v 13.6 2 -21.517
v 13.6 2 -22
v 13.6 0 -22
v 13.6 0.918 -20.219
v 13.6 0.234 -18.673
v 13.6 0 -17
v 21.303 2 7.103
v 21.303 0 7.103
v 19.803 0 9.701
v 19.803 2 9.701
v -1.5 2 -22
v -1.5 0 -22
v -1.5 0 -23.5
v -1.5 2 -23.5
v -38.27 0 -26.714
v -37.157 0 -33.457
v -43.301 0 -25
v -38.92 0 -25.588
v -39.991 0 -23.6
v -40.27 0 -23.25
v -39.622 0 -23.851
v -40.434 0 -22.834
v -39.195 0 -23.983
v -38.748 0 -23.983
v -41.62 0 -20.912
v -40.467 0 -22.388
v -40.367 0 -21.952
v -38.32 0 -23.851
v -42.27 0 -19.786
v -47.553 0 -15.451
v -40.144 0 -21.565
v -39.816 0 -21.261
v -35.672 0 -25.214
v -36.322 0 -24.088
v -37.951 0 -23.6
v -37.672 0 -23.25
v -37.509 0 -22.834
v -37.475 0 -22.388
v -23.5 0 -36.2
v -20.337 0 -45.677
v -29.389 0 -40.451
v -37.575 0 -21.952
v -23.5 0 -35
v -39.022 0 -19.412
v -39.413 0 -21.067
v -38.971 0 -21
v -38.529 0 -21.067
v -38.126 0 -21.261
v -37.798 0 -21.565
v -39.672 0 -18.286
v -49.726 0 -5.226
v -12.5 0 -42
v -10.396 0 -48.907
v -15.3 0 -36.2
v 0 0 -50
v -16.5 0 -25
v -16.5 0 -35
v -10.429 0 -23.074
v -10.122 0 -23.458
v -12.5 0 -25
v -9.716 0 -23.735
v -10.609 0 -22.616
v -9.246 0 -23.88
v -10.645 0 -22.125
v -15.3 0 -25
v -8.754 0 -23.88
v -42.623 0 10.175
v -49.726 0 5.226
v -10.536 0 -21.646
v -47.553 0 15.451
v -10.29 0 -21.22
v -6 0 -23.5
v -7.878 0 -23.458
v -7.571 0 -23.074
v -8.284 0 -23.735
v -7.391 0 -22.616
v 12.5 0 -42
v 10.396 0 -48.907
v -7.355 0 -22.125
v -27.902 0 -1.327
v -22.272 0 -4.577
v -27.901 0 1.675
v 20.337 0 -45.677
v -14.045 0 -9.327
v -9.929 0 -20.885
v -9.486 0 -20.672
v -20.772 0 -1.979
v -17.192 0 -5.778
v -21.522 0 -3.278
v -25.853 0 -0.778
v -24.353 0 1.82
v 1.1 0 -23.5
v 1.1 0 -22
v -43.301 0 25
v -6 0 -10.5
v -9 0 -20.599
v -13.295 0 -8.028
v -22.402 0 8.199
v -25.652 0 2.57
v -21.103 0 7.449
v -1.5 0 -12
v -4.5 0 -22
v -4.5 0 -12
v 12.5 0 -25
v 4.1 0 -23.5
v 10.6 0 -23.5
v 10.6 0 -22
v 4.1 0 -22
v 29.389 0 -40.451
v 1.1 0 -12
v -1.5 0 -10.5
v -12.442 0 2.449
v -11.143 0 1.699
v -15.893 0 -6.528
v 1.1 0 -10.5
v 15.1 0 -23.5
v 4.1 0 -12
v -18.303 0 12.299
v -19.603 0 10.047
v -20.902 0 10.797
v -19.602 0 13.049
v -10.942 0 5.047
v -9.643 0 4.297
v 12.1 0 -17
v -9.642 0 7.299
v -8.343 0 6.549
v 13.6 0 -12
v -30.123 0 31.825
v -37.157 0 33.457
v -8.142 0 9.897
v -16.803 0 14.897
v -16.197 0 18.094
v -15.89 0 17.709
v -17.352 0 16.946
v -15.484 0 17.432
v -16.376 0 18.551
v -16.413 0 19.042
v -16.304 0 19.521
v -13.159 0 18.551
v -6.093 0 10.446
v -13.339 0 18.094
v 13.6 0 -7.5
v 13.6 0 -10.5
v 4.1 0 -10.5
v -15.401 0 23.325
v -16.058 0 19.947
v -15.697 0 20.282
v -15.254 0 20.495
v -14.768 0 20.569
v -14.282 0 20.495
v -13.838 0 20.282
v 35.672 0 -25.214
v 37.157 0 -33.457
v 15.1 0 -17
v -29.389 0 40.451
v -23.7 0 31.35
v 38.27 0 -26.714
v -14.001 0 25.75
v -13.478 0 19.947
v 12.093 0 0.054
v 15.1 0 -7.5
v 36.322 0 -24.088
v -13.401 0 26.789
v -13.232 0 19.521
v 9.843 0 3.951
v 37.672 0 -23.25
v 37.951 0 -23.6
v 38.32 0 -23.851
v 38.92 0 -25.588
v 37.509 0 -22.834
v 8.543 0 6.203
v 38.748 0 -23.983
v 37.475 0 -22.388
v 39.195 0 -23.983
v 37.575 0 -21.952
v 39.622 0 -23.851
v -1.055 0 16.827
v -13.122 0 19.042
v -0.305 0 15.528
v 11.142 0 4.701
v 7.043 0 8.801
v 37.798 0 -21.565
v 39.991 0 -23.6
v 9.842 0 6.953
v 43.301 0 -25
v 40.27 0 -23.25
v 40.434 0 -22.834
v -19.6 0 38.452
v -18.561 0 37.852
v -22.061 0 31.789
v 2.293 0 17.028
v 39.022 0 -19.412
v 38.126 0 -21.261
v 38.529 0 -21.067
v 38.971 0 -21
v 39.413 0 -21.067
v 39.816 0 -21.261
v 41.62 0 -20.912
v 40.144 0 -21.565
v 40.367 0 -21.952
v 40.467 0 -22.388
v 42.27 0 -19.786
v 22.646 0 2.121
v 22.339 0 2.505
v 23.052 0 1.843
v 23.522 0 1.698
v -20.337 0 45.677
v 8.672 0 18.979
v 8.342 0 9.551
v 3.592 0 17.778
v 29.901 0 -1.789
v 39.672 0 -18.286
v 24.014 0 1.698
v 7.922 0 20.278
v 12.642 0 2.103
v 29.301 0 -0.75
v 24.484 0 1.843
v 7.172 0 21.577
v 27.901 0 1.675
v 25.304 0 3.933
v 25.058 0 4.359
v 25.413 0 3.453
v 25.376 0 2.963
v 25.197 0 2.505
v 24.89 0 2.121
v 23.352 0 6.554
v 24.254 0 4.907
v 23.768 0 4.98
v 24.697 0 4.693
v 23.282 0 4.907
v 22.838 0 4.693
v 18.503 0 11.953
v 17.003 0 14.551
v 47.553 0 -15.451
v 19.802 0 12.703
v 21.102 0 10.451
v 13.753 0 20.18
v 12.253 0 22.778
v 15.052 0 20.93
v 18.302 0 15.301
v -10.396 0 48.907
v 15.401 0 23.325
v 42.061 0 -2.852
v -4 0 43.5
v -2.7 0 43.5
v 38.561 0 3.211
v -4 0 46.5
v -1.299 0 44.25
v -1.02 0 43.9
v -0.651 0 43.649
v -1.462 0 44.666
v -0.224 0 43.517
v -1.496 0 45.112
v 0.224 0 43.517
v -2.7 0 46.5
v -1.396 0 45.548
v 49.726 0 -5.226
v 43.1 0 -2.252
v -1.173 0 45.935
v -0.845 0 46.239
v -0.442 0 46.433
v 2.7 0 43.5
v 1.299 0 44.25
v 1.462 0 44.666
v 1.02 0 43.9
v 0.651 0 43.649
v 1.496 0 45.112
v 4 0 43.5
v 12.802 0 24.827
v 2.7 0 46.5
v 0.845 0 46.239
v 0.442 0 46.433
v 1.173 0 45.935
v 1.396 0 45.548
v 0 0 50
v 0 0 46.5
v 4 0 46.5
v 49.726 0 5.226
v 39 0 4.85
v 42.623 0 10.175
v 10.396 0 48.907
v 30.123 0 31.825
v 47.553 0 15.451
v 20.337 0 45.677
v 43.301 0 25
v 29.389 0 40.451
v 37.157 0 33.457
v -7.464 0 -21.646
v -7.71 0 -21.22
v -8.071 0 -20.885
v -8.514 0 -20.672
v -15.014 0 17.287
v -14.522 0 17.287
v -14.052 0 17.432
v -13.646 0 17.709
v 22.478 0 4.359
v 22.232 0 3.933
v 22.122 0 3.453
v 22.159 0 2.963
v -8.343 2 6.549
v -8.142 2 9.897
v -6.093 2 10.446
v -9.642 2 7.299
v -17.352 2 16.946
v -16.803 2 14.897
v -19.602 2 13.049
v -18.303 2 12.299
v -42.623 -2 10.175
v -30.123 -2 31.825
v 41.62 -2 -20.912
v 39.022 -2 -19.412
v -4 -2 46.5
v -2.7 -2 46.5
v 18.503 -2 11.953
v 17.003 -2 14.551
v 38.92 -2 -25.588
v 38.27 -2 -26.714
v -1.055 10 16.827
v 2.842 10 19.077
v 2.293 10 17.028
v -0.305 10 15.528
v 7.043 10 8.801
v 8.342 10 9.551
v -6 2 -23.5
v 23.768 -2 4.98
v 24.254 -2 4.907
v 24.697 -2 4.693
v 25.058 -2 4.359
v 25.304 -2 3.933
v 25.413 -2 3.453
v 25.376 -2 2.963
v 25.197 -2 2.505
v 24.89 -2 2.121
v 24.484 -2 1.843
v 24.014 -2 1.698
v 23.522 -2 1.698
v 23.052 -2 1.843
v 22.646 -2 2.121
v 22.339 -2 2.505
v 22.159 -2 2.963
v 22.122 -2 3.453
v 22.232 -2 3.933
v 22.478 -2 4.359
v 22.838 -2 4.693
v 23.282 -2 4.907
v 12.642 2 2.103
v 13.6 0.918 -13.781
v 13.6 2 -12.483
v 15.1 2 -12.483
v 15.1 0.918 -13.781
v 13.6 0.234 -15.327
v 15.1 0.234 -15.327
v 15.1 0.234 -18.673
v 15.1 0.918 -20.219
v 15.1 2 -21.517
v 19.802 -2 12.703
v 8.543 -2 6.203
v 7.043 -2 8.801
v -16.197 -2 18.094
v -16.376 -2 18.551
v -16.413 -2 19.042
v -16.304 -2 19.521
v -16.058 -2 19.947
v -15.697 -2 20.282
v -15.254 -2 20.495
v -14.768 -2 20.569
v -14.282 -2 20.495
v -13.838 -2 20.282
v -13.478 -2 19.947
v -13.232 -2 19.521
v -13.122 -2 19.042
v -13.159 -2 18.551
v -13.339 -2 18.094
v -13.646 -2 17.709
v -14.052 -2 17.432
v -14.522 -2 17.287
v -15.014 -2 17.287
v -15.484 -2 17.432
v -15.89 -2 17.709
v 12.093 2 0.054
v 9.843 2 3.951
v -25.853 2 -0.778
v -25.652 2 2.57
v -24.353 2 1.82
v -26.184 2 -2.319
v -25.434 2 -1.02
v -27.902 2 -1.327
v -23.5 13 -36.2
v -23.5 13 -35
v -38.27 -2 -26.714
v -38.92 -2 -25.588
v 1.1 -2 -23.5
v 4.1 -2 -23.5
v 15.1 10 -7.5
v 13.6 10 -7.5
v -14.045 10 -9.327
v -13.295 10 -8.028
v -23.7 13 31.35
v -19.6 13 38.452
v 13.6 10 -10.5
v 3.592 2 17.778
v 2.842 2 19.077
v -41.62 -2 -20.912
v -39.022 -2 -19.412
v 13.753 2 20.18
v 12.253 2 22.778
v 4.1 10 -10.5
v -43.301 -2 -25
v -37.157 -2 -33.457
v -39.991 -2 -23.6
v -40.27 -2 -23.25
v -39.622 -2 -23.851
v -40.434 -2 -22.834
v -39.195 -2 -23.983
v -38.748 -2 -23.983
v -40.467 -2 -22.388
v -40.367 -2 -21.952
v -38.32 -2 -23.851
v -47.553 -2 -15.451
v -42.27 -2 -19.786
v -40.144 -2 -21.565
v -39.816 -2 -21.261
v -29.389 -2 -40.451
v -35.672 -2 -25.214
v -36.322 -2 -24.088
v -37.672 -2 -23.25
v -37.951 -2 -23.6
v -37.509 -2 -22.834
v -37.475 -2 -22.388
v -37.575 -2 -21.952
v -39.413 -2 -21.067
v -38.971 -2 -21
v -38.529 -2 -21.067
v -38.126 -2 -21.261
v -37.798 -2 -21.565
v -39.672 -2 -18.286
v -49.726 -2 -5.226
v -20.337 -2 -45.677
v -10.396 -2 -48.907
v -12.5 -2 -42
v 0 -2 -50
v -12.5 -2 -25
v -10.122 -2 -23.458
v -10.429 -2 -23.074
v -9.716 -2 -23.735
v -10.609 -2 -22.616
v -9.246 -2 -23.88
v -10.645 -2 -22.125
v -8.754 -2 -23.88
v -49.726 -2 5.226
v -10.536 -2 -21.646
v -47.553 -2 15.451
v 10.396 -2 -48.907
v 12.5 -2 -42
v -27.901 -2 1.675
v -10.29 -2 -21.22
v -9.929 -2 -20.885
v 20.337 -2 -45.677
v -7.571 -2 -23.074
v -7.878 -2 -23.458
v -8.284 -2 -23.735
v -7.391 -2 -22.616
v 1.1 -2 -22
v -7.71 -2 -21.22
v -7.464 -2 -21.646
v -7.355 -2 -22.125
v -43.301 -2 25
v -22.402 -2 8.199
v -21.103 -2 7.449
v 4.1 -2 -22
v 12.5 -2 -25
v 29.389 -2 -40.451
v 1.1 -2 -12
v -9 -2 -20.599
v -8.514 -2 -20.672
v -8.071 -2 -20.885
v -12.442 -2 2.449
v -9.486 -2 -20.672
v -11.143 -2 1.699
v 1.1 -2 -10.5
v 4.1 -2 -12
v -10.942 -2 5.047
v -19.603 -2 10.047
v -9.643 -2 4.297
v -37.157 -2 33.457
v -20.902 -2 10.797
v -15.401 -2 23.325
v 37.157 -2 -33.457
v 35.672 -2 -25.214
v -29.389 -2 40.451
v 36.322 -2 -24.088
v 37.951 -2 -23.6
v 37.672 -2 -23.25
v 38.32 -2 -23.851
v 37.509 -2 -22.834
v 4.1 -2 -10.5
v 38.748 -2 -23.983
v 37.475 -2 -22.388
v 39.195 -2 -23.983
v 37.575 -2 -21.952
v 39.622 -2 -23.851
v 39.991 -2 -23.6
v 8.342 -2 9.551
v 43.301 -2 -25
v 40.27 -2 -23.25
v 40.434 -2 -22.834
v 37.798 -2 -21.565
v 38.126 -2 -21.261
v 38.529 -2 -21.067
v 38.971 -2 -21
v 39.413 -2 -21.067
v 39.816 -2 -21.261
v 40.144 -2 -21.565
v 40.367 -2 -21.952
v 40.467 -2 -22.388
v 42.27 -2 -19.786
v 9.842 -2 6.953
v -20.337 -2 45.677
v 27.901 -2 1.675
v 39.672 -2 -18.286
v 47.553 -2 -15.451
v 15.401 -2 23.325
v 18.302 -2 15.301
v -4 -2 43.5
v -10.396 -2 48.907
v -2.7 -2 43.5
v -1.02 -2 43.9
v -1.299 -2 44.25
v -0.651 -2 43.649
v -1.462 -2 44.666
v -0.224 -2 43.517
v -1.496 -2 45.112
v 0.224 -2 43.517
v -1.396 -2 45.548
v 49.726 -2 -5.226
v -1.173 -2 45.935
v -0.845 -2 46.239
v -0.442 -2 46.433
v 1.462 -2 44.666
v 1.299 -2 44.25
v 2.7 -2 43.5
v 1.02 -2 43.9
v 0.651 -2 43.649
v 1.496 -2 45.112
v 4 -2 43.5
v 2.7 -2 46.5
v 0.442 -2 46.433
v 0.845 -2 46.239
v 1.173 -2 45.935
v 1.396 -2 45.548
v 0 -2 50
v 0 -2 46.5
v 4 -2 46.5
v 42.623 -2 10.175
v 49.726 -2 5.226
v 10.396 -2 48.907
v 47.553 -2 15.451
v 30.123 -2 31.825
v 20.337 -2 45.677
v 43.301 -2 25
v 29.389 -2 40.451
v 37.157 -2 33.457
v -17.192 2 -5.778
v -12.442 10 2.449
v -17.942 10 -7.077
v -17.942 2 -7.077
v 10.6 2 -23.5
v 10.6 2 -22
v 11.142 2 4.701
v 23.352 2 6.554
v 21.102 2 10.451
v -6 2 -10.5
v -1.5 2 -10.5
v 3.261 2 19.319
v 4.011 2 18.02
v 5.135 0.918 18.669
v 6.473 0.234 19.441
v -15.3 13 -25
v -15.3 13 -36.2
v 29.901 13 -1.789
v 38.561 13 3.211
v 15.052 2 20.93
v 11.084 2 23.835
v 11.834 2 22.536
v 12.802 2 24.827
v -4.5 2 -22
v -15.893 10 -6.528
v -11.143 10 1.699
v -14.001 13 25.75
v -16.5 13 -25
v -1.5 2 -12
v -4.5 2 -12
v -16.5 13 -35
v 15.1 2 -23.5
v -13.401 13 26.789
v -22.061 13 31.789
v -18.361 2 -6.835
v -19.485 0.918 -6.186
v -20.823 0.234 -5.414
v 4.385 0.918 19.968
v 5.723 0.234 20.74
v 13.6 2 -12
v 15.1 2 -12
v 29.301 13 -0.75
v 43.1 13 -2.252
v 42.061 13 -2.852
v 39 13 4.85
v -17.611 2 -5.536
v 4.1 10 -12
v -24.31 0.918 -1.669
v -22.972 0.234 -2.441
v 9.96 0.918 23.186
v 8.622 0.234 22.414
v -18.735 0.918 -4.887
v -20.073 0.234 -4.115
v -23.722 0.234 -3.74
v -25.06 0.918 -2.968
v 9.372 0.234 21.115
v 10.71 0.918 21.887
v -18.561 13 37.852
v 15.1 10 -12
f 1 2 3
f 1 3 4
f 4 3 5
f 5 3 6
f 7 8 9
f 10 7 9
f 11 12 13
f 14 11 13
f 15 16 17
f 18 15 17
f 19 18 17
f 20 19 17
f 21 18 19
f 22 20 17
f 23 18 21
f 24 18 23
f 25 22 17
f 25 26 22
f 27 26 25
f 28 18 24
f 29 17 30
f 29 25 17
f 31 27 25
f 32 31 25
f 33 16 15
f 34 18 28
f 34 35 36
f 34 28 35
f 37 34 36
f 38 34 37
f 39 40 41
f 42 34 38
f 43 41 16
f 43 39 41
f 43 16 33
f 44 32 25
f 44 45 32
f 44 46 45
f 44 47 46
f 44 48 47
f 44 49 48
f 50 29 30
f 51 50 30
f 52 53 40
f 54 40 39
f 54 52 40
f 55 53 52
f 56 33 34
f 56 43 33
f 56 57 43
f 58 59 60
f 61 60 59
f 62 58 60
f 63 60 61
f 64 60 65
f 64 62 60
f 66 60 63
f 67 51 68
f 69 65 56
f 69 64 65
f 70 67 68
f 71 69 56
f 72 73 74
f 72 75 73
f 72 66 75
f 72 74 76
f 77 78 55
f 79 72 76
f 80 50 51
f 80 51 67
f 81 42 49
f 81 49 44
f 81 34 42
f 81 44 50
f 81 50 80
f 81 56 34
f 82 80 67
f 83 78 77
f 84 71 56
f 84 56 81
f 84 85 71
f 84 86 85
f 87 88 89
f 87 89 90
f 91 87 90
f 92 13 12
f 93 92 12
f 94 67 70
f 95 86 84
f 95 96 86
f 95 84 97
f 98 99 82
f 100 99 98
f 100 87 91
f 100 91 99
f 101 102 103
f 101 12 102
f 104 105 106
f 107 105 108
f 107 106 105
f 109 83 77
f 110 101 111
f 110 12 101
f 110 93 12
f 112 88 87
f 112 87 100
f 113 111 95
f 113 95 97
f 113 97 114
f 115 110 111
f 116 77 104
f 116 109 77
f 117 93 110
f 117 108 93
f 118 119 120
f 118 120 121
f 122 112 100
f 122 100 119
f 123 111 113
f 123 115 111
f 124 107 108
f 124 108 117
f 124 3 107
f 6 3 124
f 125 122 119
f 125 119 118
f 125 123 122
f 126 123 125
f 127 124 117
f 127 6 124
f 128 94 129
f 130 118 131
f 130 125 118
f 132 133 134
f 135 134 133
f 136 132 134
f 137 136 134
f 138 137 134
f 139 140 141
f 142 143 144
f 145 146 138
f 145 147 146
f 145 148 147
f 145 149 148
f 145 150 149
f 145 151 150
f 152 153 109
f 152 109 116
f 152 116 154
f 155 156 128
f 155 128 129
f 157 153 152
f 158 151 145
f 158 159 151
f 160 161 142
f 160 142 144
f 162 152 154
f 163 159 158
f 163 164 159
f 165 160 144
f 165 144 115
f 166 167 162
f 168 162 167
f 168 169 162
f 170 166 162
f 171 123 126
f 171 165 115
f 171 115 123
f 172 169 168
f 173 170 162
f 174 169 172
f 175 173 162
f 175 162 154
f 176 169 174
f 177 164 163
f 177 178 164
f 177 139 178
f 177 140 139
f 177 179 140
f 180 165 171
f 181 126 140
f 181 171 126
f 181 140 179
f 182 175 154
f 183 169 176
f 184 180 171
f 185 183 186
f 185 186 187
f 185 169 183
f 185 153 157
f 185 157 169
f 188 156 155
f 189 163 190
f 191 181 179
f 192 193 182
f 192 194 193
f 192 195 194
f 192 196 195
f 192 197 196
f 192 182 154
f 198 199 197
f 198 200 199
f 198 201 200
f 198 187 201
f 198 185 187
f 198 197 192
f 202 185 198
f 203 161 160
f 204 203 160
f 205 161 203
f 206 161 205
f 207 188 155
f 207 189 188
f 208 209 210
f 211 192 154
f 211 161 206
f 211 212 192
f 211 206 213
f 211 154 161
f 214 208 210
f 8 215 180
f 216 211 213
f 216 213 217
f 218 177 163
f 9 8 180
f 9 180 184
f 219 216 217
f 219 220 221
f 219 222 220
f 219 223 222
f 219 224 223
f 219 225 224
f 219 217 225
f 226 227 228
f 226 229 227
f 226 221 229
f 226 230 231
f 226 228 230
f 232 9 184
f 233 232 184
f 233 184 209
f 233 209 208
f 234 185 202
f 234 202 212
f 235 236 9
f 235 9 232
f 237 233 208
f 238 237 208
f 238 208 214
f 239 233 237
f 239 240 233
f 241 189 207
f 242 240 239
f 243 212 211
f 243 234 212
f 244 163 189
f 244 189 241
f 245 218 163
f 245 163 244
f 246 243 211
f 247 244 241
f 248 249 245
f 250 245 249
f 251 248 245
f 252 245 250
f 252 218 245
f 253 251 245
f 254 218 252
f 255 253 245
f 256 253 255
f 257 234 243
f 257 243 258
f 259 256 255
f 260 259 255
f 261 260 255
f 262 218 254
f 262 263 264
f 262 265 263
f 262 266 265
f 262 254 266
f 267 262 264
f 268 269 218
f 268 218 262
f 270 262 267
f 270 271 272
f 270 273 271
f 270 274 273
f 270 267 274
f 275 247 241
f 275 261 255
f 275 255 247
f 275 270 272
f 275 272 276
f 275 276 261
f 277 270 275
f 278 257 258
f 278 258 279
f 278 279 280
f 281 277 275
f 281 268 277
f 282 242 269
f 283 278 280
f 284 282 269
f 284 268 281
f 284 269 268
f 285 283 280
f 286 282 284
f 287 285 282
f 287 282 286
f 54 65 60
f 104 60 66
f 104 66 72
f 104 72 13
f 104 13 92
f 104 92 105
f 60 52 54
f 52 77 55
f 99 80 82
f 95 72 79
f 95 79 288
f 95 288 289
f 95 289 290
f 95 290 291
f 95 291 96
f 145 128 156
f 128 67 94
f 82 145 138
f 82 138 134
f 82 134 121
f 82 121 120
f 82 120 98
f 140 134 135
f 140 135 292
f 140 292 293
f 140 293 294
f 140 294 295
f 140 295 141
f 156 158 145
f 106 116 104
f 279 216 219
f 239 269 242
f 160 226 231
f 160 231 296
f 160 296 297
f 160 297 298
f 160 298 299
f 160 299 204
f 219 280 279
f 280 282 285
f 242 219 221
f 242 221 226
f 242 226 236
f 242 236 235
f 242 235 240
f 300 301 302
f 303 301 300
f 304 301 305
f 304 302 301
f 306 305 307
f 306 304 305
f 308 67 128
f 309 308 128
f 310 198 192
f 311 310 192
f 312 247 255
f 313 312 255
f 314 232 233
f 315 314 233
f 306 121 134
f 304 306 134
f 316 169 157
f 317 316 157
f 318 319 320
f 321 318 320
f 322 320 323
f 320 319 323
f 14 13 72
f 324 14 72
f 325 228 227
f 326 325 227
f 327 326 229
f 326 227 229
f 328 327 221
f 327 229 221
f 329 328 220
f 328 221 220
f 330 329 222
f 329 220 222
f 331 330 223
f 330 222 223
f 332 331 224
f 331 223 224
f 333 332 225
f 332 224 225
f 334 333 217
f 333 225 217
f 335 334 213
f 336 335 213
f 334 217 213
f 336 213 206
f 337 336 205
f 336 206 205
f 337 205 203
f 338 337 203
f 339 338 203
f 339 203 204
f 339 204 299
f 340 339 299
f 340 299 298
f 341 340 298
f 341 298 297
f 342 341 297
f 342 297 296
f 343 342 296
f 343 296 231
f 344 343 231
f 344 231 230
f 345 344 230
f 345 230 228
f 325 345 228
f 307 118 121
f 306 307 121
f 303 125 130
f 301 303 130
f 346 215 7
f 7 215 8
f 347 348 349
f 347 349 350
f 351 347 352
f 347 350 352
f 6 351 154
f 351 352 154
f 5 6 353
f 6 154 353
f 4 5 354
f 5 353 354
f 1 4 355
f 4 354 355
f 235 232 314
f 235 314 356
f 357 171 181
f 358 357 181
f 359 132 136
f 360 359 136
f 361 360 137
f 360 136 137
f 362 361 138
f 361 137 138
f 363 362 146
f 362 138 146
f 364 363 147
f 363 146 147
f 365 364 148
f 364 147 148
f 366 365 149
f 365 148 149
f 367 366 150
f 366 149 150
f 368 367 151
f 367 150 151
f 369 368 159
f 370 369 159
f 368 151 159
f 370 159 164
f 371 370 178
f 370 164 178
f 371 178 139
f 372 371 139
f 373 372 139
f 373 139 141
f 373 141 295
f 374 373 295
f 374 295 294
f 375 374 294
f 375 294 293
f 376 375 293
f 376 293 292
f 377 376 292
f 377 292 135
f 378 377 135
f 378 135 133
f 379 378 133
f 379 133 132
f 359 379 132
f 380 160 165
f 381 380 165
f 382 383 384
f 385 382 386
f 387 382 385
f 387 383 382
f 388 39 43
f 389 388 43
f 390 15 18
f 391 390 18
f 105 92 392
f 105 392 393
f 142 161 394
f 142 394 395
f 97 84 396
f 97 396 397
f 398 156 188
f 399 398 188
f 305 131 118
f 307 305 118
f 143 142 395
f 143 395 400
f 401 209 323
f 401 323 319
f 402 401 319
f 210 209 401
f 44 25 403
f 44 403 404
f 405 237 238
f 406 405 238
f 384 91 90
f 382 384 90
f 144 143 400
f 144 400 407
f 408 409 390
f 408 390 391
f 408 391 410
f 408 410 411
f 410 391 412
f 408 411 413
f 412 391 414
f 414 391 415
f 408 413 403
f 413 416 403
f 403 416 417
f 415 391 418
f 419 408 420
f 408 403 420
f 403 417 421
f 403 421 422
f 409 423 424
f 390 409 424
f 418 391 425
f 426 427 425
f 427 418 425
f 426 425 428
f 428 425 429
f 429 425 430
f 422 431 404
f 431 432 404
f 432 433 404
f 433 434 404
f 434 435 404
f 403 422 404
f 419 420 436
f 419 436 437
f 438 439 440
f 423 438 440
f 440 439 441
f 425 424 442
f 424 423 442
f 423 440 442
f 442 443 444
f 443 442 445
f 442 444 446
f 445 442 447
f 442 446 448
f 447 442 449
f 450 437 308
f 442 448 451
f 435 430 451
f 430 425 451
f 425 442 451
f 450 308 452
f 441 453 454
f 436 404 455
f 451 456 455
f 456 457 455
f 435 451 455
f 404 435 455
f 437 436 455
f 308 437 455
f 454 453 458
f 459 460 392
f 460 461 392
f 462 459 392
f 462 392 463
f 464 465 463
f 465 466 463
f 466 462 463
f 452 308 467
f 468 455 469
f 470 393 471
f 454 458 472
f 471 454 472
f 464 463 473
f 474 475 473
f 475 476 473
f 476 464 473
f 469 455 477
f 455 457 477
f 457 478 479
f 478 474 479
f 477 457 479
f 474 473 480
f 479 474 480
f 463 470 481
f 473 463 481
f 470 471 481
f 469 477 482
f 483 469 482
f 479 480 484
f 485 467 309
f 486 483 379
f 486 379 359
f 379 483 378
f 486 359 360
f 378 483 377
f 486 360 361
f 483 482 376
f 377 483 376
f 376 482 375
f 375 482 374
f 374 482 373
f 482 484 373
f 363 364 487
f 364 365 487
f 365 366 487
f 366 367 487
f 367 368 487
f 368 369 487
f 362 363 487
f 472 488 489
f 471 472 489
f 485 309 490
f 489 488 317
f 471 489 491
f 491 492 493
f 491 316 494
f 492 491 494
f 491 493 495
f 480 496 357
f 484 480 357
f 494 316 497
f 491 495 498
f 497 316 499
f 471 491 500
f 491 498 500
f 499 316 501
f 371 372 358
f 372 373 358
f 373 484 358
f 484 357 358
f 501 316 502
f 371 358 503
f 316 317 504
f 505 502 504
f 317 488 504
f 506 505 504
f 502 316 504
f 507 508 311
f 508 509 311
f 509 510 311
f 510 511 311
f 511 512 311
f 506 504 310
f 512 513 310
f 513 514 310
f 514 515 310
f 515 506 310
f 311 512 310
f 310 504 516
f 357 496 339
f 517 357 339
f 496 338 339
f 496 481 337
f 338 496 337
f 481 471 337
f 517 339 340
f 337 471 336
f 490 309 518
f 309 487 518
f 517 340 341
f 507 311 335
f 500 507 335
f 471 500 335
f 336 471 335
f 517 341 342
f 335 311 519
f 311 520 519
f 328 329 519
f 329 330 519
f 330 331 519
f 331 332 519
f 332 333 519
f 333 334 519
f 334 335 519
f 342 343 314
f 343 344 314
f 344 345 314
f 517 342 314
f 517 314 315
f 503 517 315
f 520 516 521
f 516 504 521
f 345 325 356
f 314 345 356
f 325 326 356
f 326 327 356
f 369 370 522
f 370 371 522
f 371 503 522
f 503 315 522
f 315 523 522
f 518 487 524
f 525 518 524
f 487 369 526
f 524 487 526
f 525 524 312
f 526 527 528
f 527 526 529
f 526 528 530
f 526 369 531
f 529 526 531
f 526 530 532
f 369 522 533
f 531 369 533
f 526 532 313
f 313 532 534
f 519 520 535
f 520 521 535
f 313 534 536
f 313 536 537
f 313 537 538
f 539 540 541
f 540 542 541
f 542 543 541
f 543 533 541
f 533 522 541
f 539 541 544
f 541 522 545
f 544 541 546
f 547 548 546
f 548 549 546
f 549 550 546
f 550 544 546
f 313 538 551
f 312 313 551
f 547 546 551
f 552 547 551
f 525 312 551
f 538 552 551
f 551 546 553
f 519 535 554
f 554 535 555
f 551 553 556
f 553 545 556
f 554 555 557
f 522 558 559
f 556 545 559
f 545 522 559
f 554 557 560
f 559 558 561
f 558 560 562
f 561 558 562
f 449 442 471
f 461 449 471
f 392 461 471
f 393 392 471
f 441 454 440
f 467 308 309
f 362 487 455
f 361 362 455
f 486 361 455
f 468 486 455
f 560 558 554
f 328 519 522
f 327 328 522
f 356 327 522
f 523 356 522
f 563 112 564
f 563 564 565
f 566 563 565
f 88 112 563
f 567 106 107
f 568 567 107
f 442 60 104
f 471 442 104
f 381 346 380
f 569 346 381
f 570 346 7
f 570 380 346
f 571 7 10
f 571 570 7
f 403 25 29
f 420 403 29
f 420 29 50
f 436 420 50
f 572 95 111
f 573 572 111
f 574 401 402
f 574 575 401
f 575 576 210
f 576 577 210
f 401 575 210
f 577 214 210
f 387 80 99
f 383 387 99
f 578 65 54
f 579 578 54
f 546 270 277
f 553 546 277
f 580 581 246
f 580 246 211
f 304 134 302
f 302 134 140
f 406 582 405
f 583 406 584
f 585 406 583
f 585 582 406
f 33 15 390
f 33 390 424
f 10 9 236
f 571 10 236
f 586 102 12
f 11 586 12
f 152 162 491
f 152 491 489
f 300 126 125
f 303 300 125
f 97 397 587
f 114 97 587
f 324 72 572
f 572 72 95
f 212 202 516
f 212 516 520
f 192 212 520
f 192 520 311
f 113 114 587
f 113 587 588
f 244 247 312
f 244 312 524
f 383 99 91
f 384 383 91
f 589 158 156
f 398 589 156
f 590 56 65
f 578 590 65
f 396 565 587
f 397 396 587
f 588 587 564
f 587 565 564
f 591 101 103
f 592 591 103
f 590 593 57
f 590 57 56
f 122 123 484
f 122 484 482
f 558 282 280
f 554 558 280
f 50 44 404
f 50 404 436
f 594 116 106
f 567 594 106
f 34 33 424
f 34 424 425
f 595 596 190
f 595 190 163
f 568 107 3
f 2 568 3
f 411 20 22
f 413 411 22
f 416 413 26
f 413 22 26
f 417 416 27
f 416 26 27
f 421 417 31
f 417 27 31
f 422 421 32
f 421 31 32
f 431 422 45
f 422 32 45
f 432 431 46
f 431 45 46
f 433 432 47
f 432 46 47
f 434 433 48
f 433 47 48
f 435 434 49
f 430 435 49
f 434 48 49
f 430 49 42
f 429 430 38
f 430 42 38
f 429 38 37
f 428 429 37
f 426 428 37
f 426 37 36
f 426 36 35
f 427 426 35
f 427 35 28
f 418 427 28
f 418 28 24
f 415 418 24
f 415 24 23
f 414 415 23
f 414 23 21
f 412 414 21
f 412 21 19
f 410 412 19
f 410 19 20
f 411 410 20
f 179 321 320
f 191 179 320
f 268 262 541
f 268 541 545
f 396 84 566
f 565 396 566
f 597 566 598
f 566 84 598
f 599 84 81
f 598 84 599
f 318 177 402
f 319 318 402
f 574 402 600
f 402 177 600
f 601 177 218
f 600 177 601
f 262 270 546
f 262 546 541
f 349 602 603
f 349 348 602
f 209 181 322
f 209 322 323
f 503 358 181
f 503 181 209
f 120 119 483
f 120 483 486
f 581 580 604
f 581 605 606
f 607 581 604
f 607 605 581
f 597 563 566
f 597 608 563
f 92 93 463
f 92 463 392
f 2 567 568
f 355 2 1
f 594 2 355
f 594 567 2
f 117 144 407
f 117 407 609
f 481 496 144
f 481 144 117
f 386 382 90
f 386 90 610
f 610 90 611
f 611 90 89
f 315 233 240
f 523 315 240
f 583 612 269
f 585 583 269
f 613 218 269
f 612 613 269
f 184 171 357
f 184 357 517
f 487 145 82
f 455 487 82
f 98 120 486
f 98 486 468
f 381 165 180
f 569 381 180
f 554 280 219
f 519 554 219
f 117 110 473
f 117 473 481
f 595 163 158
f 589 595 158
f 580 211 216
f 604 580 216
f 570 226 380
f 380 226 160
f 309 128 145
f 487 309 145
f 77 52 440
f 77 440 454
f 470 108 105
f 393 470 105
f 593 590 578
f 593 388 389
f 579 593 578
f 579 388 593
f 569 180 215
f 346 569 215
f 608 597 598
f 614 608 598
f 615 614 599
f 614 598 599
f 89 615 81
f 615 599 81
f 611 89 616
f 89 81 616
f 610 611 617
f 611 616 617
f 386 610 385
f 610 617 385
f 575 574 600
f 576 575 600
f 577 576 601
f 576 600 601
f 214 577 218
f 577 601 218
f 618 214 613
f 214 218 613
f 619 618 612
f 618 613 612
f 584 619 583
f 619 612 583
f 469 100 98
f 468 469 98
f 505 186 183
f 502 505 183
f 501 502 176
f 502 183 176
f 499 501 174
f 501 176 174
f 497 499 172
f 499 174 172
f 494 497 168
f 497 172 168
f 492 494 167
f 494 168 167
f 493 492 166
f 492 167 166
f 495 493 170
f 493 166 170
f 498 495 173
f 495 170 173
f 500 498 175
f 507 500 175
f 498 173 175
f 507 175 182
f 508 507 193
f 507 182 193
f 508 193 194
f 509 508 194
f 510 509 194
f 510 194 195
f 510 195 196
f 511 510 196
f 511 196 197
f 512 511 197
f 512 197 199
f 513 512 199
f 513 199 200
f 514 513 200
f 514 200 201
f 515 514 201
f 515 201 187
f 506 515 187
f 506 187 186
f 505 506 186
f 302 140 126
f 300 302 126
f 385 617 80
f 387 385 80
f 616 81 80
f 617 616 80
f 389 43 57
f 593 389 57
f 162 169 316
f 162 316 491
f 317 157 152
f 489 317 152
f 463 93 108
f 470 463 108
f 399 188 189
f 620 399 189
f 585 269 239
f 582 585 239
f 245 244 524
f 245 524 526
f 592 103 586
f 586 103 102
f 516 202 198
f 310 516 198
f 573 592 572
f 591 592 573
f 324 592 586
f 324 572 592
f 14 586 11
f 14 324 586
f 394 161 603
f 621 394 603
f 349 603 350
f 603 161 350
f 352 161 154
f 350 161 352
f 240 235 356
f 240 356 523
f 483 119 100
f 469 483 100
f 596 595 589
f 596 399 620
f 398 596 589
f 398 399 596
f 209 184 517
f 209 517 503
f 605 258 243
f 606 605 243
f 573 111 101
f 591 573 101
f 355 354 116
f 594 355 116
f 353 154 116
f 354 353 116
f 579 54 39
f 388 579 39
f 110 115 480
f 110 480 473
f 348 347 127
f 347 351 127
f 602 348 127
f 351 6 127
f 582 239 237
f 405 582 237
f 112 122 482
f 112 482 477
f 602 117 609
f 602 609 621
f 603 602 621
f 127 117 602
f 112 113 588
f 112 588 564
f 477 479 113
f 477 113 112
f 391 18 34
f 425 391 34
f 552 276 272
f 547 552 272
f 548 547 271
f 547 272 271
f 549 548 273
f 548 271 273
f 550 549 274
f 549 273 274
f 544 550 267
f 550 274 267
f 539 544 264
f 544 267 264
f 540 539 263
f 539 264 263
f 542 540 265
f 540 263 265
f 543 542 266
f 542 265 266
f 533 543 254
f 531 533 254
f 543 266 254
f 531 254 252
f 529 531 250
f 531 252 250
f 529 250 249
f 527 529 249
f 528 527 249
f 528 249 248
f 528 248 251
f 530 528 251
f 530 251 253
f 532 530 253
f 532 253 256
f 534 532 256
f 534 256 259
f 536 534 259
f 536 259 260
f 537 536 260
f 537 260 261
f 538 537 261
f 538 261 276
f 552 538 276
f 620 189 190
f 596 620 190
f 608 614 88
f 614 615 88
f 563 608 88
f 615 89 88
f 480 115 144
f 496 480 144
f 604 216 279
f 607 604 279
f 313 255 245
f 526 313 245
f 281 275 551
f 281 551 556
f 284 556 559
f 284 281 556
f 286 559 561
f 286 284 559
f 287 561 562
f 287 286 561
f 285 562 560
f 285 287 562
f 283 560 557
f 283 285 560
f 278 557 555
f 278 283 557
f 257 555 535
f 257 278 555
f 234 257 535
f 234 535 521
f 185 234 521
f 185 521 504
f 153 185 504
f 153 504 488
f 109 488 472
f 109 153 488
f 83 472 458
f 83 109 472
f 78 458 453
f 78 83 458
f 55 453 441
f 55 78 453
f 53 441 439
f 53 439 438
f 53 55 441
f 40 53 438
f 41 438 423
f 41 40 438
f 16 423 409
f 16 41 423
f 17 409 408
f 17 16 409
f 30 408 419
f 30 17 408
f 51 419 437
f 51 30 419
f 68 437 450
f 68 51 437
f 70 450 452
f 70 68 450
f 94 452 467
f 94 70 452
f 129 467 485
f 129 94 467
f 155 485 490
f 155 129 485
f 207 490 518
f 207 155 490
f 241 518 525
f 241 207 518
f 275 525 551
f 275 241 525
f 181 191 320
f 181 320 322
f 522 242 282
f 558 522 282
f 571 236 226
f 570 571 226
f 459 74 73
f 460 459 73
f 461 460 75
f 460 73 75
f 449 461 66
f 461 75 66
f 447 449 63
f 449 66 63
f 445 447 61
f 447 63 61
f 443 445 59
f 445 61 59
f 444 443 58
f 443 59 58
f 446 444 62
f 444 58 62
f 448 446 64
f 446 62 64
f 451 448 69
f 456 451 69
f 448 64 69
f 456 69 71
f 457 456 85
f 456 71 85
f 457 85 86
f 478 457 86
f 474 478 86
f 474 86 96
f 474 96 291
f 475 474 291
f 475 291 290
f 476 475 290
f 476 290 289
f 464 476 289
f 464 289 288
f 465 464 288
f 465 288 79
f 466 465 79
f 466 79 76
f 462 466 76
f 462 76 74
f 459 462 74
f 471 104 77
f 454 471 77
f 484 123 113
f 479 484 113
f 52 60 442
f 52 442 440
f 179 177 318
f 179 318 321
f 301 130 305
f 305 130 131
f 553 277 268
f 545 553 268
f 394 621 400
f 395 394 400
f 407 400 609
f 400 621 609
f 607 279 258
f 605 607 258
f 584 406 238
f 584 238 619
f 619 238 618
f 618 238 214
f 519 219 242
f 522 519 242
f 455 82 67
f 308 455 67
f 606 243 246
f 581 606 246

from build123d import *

# Parameters (mm, degrees)
SKETCH_1_R               = 50
SKETCH_1_W               = 25
SKETCH_1_H               = 17
EXTRUDE_1_DEPTH          = 2
EXTRUDE_2_DEPTH          = 2
SKETCH_3_R               = 6.1
CUT_EXTRUDE_1_DEPTH      = 3
SKETCH_4_W               = 3
SKETCH_4_H               = 1.5
CUT_EXTRUDE_2_DEPTH      = 3
PATTERN_CIRCULAR_2_COUNT = 3
SKETCH_5_R               = 1.5
SKETCH_5_W               = 1.3
SKETCH_5_H               = 3
CUT_EXTRUDE_3_DEPTH      = 3
PATTERN_CIRCULAR_3_COUNT = 3
EXTRUDE_3_DEPTH          = 10
PATTERN_CIRCULAR_6_COUNT = 3
EXTRUDE_4_DEPTH          = 13
PATTERN_CIRCULAR_7_COUNT = 3
SKETCH_10_R              = 1.65
CUT_EXTRUDE_4_DEPTH      = 8
PATTERN_CIRCULAR_8_COUNT = 3


with BuildPart() as part:
    # 草图1 → 凸台-拉伸1 (new body)
    with BuildSketch(Plane(origin=(0, 0, 0), x_dir=(1, 0, 0), z_dir=(0, 1, 0))):
        with Locations(Location((0, 0, 0), (0, 0, 270))):
            Circle(SKETCH_1_R)
        Polygon((42.623066959, -10.174682453), (27.900635095, -1.674682453), (15.400635095, -23.325317547), (30.123066959, -31.825317547), align=None, mode=Mode.SUBTRACT)
        with Locations((0, 33.5)):
            Rectangle(SKETCH_1_W, SKETCH_1_H, mode=Mode.SUBTRACT)
        Polygon((-30.123066959, -31.825317547), (-15.400635095, -23.325317547), (-27.900635095, -1.674682453), (-42.623066959, -10.174682453), align=None, mode=Mode.SUBTRACT)
    extrude(amount=-EXTRUDE_1_DEPTH)

    # 草图2 → 凸台-拉伸2 (add)
    with BuildSketch(Plane(origin=(0, 0, 0), x_dir=(1, 0, 0), z_dir=(0, 1, 0))):
        Polygon((10.6, 23.5), (10.6, 22), (13.6, 22), (13.6, 12), (10.6, 12), (10.6, 10.5), (15.1, 10.5), (15.1, 23.5), align=None)
        Polygon((-4.5, 12), (-4.5, 22), (-1.5, 22), (-1.5, 23.5), (-6, 23.5), (-6, 10.5), (-1.5, 10.5), (-1.5, 12), align=None)
    extrude_2 = extrude(amount=EXTRUDE_2_DEPTH)

    # 草图3 → 切除-拉伸1 (cut)
    with BuildSketch(Plane(origin=(15.1, 0, 0), x_dir=(0, 0, -1), z_dir=(1, 0, 0))):
        with Locations((17, 6.1)):
            Circle(SKETCH_3_R)
    cut_extrude_1 = extrude(amount=-CUT_EXTRUDE_1_DEPTH, mode=Mode.SUBTRACT)

    # 草图4 → 切除-拉伸2 (cut)
    with BuildSketch(Plane(origin=(0, 0, 0), x_dir=(1, 0, 0), z_dir=(0, 1, 0))):
        with Locations((2.6, 22.75)):
            Rectangle(SKETCH_4_W, SKETCH_4_H)
        with Locations((2.6, 11.25)):
            Rectangle(SKETCH_4_W, SKETCH_4_H)
    cut_extrude_2 = extrude(amount=-CUT_EXTRUDE_2_DEPTH, mode=Mode.SUBTRACT)

    # 阵列(圆周)2: 凸台-拉伸2, 切除-拉伸1, 切除-拉伸2 ×3 about axis
    pattern_circular_2_axis = Axis((0, 0, 0), (0, 1, 0))
    add([extrude_2.rotate(pattern_circular_2_axis, i * 360 / PATTERN_CIRCULAR_2_COUNT) for i in range(1, PATTERN_CIRCULAR_2_COUNT)])
    add([cut_extrude_1.rotate(pattern_circular_2_axis, i * 360 / PATTERN_CIRCULAR_2_COUNT) for i in range(1, PATTERN_CIRCULAR_2_COUNT)], mode=Mode.SUBTRACT)
    add([cut_extrude_2.rotate(pattern_circular_2_axis, i * 360 / PATTERN_CIRCULAR_2_COUNT) for i in range(1, PATTERN_CIRCULAR_2_COUNT)], mode=Mode.SUBTRACT)

    # 草图5 → 切除-拉伸3 (cut)
    with BuildSketch(Plane(origin=(0, 0, 0), x_dir=(1, 0, 0), z_dir=(0, 1, 0))):
        with Locations(Location((0, -45, 0), (0, 0, 270))):
            Circle(SKETCH_5_R)
        with Locations((-3.35, -45)):
            Rectangle(SKETCH_5_W, SKETCH_5_H)
        with Locations((3.35, -45)):
            Rectangle(SKETCH_5_W, SKETCH_5_H)
    cut_extrude_3 = extrude(amount=-CUT_EXTRUDE_3_DEPTH, mode=Mode.SUBTRACT)

    # 阵列(圆周)3: 切除-拉伸3 ×3 about axis
    pattern_circular_3_axis = Axis((0, 0, 0), (0, 1, 0))
    for i in range(1, PATTERN_CIRCULAR_3_COUNT):
        add(cut_extrude_3.rotate(pattern_circular_3_axis, i * 360 / PATTERN_CIRCULAR_3_COUNT), mode=Mode.SUBTRACT)

    # 草图8 → 凸台-拉伸3 (add)
    with BuildSketch(Plane(origin=(0, 0, 0), x_dir=(1, 0, 0), z_dir=(0, 1, 0))):
        Polygon((4.1, 12), (15.1, 12), (15.1, 10.5), (15.1, 7.5), (13.6, 7.5), (13.6, 10.5), (4.1, 10.5), align=None)
    extrude_3 = extrude(amount=EXTRUDE_3_DEPTH)

    # 阵列(圆周)6: 凸台-拉伸3 ×3 about axis
    pattern_circular_6_axis = Axis((0, 0, 0), (0, 1, 0))
    for i in range(1, PATTERN_CIRCULAR_6_COUNT):
        add(extrude_3.rotate(pattern_circular_6_axis, i * 360 / PATTERN_CIRCULAR_6_COUNT))

    # 草图9 → 凸台-拉伸4 (add)
    with BuildSketch(Plane(origin=(0, 0, 0), x_dir=(1, 0, 0), z_dir=(0, 1, 0))):
        Polygon((-16.5, 35), (-16.5, 25), (-15.3, 25), (-15.3, 36.2), (-23.5, 36.2), (-23.5, 35), align=None)
    extrude_4 = extrude(amount=EXTRUDE_4_DEPTH)

    # 阵列(圆周)7: 凸台-拉伸4 ×3 about axis
    pattern_circular_7_axis = Axis((0, 0, 0), (0, 1, 0))
    for i in range(1, PATTERN_CIRCULAR_7_COUNT):
        add(extrude_4.rotate(pattern_circular_7_axis, i * 360 / PATTERN_CIRCULAR_7_COUNT))

    # 草图10 → 切除-拉伸4 (cut)
    with BuildSketch(Plane(origin=(0, 0, 0), x_dir=(1, 0, 0), z_dir=(0, 1, 0))):
        with Locations(Location((23.767848868, -3.330069097, 0), (0, 0, 270))):
            Circle(SKETCH_10_R)
    cut_extrude_4 = extrude(amount=-CUT_EXTRUDE_4_DEPTH, mode=Mode.SUBTRACT)

    # 阵列(圆周)8: 切除-拉伸4 ×3 about axis
    pattern_circular_8_axis = Axis((0, 0, 0), (0, 1, 0))
    for i in range(1, PATTERN_CIRCULAR_8_COUNT):
        add(cut_extrude_4.rotate(pattern_circular_8_axis, i * 360 / PATTERN_CIRCULAR_8_COUNT), mode=Mode.SUBTRACT)


solid = part.part
